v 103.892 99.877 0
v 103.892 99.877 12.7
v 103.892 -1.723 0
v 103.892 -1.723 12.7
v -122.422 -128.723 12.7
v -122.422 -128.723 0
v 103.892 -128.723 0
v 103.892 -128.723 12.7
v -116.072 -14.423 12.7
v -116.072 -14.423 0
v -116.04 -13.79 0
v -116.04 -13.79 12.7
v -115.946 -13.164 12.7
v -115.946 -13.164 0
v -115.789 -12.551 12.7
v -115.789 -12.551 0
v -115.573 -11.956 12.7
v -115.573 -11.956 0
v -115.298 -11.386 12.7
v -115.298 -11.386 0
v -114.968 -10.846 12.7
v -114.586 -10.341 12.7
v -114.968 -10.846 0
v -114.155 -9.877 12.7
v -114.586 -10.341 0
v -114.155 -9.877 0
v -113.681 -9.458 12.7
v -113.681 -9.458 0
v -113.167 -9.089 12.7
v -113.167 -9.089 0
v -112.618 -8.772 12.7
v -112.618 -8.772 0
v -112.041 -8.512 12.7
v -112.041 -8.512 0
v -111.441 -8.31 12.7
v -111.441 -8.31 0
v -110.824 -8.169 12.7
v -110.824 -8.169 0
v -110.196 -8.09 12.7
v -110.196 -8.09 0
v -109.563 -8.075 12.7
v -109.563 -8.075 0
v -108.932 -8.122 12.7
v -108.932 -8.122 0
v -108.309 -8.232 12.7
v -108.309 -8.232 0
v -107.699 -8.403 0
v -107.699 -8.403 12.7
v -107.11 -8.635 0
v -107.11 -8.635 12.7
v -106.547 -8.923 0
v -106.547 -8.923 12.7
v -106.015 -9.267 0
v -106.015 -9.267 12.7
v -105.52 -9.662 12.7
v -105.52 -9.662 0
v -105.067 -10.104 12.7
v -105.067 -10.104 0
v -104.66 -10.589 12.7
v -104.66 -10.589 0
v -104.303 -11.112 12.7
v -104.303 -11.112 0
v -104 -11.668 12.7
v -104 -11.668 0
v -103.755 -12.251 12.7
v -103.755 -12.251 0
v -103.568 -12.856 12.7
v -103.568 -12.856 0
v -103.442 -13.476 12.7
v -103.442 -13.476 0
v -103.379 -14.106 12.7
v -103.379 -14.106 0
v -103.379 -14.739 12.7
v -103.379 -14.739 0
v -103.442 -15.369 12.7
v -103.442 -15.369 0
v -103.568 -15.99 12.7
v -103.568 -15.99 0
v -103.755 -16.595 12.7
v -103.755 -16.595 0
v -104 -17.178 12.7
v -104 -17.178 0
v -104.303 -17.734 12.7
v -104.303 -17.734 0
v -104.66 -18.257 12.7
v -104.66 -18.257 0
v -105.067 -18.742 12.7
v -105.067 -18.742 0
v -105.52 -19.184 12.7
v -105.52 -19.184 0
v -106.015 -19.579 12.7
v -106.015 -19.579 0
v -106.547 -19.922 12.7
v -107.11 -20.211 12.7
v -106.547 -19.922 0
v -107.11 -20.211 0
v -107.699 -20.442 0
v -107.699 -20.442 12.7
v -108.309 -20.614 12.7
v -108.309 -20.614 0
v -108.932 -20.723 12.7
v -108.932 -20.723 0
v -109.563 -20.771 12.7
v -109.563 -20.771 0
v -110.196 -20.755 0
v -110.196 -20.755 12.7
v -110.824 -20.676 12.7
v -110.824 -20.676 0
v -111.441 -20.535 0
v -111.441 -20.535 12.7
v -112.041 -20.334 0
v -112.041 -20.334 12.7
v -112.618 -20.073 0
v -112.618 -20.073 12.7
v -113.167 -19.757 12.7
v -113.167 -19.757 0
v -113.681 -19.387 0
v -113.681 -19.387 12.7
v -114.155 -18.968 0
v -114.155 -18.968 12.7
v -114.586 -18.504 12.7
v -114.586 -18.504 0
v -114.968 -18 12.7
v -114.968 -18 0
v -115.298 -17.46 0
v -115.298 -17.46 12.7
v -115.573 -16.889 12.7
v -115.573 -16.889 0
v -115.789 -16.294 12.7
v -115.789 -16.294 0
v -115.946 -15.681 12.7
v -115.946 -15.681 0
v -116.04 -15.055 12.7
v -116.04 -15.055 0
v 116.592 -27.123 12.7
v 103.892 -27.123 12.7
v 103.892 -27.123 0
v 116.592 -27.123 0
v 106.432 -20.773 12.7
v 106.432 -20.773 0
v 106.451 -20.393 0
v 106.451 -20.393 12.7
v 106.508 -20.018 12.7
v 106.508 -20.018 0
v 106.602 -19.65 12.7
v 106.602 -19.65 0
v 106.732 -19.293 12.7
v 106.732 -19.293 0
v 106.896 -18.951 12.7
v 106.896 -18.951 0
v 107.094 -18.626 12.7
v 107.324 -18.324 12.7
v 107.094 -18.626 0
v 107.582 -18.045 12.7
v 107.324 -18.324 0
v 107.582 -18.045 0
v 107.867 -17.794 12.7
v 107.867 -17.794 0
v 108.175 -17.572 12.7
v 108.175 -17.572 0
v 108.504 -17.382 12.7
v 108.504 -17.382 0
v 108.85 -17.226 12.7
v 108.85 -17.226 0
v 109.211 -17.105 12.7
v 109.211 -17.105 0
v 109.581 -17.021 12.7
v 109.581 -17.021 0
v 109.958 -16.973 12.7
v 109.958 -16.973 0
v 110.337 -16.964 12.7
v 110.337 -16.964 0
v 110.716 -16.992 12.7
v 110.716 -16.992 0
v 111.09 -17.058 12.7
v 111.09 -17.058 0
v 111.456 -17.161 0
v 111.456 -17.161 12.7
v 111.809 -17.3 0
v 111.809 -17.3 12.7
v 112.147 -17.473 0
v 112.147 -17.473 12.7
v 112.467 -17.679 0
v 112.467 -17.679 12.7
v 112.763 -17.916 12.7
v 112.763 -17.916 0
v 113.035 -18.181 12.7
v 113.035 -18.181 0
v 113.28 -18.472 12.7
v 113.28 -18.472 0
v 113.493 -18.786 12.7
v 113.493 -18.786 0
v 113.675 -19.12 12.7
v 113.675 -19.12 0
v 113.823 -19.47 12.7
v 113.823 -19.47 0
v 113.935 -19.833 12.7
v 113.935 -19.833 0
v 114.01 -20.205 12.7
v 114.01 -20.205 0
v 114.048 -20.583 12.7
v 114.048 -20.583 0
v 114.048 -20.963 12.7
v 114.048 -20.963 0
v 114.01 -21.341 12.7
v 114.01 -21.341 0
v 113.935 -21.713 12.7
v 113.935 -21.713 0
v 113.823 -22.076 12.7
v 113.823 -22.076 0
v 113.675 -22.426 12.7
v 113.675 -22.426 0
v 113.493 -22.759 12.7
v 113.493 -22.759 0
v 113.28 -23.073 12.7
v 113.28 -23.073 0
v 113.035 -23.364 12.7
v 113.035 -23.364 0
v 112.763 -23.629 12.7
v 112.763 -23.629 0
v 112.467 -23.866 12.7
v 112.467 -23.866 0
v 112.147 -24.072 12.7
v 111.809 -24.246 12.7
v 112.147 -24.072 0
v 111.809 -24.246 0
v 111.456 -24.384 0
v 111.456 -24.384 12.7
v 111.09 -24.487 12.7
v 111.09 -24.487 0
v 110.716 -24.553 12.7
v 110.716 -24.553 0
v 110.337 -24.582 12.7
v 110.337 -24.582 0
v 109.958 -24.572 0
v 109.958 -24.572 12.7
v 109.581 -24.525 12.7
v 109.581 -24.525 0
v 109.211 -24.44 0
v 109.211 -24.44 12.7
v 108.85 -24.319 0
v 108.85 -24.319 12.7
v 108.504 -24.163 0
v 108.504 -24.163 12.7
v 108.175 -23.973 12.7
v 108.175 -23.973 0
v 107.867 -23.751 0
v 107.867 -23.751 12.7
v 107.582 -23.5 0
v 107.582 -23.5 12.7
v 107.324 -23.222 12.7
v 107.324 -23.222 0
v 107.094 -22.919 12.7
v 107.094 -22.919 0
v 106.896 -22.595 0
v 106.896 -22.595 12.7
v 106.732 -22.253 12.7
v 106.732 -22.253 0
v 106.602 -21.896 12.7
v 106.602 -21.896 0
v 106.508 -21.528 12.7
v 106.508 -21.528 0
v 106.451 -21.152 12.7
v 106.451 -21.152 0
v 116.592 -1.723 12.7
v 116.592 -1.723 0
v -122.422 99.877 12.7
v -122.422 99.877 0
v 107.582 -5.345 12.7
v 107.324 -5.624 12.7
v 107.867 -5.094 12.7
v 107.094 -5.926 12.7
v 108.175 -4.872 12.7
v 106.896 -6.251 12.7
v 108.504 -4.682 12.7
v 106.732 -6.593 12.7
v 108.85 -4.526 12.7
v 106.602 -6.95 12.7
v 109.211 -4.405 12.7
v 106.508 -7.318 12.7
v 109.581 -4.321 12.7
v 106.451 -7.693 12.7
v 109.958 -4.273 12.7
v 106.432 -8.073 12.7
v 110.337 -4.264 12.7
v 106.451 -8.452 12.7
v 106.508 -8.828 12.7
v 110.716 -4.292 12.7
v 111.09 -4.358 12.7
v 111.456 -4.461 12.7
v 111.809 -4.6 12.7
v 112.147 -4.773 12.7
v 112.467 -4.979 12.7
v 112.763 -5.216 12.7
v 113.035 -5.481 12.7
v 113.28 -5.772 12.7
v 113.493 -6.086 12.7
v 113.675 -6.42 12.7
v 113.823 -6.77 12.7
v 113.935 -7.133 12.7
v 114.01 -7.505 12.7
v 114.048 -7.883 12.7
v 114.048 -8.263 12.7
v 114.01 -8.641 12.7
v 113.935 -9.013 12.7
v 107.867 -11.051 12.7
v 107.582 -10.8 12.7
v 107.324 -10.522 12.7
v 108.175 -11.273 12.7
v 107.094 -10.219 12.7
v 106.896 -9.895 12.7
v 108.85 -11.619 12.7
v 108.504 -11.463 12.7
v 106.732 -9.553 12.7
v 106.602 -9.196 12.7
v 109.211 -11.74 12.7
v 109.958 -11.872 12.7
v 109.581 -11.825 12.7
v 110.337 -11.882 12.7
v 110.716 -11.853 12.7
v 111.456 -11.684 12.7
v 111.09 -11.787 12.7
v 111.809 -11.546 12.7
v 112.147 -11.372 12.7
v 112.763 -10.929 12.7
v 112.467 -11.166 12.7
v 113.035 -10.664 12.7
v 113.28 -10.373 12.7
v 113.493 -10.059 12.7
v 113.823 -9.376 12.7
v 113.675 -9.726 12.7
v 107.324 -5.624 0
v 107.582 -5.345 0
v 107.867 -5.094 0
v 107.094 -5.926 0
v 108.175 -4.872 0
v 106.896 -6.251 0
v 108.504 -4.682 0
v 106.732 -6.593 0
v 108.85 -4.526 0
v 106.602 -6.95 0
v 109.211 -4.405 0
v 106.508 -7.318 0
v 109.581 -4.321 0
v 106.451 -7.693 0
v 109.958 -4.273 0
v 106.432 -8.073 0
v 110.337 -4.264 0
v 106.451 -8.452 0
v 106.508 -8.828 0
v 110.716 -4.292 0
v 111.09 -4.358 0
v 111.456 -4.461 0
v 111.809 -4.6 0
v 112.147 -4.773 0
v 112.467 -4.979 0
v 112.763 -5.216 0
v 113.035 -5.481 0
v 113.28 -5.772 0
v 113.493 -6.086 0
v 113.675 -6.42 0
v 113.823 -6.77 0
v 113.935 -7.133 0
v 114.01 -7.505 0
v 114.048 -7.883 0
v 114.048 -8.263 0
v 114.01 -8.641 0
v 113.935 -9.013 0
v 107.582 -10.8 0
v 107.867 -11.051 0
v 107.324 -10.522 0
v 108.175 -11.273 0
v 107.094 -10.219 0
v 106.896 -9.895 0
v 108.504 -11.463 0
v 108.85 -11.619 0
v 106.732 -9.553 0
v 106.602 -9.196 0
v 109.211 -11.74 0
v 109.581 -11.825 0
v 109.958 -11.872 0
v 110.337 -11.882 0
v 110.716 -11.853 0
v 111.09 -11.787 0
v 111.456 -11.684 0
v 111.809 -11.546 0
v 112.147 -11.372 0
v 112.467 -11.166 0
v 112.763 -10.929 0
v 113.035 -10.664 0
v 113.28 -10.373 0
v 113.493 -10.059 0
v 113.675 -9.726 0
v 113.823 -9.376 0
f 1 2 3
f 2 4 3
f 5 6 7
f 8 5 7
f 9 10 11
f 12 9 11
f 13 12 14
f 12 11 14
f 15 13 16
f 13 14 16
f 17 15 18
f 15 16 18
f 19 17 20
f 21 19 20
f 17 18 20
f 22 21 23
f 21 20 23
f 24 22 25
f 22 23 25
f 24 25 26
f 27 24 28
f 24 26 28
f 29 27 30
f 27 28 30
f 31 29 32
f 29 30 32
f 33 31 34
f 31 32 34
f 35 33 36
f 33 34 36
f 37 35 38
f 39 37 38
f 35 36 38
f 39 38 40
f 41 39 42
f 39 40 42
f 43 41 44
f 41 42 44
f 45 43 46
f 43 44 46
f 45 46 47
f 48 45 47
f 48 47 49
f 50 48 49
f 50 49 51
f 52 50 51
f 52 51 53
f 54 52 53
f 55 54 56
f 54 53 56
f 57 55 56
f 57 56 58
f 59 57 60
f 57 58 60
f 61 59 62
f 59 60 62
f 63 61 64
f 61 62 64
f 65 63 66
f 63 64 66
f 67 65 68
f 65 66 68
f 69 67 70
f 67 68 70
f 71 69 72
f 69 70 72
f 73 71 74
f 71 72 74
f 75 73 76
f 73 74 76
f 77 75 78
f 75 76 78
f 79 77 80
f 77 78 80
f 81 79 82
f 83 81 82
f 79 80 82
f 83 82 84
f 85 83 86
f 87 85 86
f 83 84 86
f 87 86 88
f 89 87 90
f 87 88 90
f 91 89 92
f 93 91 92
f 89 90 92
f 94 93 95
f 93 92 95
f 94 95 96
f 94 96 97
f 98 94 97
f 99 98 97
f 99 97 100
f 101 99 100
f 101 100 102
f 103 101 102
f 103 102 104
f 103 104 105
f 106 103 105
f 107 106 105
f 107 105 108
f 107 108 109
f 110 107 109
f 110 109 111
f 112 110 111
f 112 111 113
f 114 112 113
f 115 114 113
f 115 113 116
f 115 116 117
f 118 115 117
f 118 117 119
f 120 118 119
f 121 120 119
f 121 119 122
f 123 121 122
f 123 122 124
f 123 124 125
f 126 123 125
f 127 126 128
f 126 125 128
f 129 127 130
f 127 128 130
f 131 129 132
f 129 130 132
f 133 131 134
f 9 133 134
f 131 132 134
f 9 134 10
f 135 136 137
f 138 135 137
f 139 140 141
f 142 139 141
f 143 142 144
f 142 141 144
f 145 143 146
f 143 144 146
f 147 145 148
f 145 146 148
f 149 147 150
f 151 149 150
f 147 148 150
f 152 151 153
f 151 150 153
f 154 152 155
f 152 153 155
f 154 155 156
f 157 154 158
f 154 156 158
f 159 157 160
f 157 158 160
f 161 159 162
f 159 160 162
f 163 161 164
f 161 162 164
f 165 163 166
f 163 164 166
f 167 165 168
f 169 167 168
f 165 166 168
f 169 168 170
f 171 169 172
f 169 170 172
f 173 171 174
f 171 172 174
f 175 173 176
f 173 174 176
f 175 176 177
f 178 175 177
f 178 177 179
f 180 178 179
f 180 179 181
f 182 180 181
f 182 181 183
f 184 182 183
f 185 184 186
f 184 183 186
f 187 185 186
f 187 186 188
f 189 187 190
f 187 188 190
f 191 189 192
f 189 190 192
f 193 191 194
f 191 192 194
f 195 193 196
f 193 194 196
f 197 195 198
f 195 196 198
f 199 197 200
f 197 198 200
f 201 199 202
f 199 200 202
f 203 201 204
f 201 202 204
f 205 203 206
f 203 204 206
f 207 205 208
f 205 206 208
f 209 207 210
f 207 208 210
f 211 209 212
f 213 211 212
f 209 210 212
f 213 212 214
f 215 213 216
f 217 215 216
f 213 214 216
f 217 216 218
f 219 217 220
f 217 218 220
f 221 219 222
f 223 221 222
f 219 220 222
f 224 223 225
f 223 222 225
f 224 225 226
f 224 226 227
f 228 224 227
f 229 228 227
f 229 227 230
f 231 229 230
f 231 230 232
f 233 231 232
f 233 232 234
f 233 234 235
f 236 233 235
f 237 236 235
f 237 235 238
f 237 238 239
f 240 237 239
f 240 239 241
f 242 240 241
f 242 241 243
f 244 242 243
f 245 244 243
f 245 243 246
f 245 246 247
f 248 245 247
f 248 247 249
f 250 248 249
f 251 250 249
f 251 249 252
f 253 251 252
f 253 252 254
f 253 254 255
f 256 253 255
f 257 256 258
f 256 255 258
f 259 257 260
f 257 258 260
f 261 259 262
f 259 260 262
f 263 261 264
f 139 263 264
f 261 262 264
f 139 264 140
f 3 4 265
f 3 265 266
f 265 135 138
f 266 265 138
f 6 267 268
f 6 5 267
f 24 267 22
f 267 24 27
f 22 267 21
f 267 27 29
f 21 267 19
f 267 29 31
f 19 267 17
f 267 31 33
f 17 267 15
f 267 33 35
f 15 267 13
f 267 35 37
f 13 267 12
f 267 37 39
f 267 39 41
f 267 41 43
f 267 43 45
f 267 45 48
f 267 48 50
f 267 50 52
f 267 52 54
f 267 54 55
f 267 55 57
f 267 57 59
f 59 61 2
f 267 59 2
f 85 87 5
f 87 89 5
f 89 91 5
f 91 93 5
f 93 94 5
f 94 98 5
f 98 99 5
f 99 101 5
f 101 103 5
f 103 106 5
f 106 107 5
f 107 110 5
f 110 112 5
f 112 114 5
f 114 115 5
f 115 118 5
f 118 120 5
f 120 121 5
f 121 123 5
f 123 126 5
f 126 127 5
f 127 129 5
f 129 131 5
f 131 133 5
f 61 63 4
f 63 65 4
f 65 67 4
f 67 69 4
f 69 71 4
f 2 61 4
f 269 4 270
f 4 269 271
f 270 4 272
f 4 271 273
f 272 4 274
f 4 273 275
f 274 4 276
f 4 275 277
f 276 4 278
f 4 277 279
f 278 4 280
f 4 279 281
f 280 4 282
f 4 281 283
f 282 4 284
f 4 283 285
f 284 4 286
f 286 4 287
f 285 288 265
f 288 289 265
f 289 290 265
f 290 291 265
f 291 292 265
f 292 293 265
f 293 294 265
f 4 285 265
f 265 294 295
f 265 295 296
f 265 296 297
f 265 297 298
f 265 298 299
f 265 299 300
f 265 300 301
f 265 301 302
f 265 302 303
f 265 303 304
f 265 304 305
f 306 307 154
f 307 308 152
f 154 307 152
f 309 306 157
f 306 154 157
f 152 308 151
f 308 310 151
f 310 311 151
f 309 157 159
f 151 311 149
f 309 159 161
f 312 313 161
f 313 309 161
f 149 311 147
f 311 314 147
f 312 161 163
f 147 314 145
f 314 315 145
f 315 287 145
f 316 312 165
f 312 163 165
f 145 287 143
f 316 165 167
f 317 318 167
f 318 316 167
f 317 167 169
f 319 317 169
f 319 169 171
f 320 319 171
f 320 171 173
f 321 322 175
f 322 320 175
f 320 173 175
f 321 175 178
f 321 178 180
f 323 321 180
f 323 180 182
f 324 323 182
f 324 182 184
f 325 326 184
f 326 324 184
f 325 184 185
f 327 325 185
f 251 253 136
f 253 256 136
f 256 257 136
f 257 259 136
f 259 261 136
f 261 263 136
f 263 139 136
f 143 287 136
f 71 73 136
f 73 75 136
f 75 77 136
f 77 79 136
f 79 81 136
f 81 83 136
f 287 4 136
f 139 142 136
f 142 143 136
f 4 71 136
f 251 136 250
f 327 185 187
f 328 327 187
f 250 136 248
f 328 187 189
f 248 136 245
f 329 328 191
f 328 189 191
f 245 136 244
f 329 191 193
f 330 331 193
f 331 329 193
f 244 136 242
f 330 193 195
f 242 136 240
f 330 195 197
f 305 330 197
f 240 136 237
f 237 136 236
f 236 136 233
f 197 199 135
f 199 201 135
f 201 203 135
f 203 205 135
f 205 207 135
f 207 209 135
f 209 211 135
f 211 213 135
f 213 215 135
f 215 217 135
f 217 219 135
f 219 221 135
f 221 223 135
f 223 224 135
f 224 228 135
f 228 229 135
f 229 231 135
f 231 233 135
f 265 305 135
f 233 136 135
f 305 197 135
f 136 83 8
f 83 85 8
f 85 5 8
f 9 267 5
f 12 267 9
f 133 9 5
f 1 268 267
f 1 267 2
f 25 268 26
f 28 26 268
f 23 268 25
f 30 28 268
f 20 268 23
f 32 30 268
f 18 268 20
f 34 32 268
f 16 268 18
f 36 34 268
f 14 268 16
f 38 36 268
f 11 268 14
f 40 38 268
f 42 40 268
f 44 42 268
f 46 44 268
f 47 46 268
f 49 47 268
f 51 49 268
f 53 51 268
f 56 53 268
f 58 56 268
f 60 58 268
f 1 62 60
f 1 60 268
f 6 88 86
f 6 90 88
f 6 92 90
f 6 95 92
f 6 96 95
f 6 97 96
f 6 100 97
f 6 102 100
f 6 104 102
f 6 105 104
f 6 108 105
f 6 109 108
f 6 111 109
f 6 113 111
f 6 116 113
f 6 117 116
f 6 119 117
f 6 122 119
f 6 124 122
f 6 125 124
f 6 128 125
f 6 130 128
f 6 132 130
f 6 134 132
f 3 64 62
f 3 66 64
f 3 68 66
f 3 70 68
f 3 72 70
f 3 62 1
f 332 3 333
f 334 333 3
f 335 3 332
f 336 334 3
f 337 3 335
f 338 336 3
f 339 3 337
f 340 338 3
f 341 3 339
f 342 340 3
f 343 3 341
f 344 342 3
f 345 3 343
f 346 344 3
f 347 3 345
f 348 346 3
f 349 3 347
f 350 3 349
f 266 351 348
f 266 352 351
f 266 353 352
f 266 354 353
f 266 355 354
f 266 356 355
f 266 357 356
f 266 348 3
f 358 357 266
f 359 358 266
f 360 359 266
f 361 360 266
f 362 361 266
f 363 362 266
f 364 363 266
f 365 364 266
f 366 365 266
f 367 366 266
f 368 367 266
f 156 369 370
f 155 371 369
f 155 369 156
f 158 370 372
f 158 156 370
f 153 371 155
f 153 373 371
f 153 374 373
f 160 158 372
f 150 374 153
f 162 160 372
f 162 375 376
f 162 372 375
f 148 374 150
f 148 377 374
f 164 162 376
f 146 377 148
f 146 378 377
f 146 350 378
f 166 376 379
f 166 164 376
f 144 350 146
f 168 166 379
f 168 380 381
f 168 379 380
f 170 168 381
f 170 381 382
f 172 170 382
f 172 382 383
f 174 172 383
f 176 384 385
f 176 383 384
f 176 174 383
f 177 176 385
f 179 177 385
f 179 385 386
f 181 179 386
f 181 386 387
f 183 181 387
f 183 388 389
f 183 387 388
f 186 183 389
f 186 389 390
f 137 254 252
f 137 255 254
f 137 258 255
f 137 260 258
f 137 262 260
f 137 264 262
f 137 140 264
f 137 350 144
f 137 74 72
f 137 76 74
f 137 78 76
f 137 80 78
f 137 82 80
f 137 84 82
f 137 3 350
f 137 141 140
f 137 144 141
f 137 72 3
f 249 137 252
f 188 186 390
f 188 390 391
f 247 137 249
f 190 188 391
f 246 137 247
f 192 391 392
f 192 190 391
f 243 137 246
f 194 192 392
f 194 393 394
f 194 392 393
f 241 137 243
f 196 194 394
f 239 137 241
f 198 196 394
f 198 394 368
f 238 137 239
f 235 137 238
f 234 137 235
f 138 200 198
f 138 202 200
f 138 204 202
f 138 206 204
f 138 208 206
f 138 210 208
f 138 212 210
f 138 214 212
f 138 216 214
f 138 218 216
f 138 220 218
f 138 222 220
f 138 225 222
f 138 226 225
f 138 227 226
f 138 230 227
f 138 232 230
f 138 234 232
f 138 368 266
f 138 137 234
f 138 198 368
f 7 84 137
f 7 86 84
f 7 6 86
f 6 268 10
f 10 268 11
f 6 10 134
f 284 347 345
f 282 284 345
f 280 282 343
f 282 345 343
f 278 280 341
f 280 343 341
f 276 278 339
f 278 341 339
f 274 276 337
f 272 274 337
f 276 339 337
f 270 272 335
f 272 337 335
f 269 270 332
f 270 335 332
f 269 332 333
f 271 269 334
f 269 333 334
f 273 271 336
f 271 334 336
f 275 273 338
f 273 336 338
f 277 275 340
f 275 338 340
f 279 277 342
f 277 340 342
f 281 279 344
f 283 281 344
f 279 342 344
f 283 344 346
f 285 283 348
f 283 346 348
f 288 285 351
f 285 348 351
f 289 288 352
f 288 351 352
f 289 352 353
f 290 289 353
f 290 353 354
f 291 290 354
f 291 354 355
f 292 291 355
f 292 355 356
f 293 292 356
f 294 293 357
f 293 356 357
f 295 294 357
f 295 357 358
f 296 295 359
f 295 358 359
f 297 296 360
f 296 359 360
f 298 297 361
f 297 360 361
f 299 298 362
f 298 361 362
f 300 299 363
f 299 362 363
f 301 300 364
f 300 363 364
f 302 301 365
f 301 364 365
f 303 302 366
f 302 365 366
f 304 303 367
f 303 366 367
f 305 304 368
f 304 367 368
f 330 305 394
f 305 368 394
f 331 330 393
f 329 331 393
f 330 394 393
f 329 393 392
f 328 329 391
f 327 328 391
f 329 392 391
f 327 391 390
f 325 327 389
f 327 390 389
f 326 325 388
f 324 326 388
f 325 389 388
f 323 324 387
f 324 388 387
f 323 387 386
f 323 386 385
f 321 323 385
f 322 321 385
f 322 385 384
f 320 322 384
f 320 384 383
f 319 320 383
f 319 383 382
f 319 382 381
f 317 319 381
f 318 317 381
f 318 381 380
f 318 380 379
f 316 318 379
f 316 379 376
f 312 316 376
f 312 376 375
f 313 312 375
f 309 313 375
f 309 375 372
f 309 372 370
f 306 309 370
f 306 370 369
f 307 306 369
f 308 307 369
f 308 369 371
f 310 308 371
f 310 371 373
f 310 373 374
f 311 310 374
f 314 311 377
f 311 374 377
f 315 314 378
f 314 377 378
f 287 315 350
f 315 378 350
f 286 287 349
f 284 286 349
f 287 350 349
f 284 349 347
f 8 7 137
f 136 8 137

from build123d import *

# Parameters (mm, degrees)
SKETCH2_W           = 226.314
SKETCH2_H           = 215.9
BOSS_EXTRUDE1_DEPTH = 12.7
SKETCH3_W           = 12.7
SKETCH3_H           = 25.4
BOSS_EXTRUDE2_DEPTH = 12.7
SKETCH4_R           = 6.35
SKETCH4_R_2         = 3.81
CUT_EXTRUDE1_DEPTH  = 12.7
SKETCH5_W           = 226.314
SKETCH5_H           = 12.7
BOSS_EXTRUDE3_DEPTH = 12.7


with BuildPart() as part:
    # Sketch2 → Boss-Extrude1 (new body)
    with BuildSketch(Plane.XY):
        with Locations((-9.264561791, -20.772712934)):
            Rectangle(SKETCH2_W, SKETCH2_H)
    extrude(amount=BOSS_EXTRUDE1_DEPTH)

    # Sketch3 → Boss-Extrude2 (add)
    with BuildSketch(Plane(origin=(103.892438209, 0, 0), x_dir=(0, 0, -1), z_dir=(1, 0, 0))):
        with Locations((-6.35, -14.422712934)):
            Rectangle(SKETCH3_W, SKETCH3_H)
    extrude(amount=BOSS_EXTRUDE2_DEPTH)

    # Sketch4 → Cut-Extrude1 (cut)
    with BuildSketch(Plane(origin=(0, 0, 0), x_dir=(-1, 0, 0), z_dir=(0, 0, -1))):
        with Locations((109.721561791, -14.422712934)):
            Circle(SKETCH4_R)
        with Locations((-110.242438209, -8.072712934)):
            Circle(SKETCH4_R_2)
        with Locations((-110.242438209, -20.772712934)):
            Circle(SKETCH4_R_2)
    extrude(amount=-CUT_EXTRUDE1_DEPTH, mode=Mode.SUBTRACT)

    # Sketch5 → Boss-Extrude3 (add)
    with BuildSketch(Plane(origin=(0, 87.177287066, 0), x_dir=(1, 0, 0), z_dir=(0, 1, 0))):
        with Locations((-9.264561791, -6.35)):
            Rectangle(SKETCH5_W, SKETCH5_H)
    extrude(amount=BOSS_EXTRUDE3_DEPTH)


solid = part.part
